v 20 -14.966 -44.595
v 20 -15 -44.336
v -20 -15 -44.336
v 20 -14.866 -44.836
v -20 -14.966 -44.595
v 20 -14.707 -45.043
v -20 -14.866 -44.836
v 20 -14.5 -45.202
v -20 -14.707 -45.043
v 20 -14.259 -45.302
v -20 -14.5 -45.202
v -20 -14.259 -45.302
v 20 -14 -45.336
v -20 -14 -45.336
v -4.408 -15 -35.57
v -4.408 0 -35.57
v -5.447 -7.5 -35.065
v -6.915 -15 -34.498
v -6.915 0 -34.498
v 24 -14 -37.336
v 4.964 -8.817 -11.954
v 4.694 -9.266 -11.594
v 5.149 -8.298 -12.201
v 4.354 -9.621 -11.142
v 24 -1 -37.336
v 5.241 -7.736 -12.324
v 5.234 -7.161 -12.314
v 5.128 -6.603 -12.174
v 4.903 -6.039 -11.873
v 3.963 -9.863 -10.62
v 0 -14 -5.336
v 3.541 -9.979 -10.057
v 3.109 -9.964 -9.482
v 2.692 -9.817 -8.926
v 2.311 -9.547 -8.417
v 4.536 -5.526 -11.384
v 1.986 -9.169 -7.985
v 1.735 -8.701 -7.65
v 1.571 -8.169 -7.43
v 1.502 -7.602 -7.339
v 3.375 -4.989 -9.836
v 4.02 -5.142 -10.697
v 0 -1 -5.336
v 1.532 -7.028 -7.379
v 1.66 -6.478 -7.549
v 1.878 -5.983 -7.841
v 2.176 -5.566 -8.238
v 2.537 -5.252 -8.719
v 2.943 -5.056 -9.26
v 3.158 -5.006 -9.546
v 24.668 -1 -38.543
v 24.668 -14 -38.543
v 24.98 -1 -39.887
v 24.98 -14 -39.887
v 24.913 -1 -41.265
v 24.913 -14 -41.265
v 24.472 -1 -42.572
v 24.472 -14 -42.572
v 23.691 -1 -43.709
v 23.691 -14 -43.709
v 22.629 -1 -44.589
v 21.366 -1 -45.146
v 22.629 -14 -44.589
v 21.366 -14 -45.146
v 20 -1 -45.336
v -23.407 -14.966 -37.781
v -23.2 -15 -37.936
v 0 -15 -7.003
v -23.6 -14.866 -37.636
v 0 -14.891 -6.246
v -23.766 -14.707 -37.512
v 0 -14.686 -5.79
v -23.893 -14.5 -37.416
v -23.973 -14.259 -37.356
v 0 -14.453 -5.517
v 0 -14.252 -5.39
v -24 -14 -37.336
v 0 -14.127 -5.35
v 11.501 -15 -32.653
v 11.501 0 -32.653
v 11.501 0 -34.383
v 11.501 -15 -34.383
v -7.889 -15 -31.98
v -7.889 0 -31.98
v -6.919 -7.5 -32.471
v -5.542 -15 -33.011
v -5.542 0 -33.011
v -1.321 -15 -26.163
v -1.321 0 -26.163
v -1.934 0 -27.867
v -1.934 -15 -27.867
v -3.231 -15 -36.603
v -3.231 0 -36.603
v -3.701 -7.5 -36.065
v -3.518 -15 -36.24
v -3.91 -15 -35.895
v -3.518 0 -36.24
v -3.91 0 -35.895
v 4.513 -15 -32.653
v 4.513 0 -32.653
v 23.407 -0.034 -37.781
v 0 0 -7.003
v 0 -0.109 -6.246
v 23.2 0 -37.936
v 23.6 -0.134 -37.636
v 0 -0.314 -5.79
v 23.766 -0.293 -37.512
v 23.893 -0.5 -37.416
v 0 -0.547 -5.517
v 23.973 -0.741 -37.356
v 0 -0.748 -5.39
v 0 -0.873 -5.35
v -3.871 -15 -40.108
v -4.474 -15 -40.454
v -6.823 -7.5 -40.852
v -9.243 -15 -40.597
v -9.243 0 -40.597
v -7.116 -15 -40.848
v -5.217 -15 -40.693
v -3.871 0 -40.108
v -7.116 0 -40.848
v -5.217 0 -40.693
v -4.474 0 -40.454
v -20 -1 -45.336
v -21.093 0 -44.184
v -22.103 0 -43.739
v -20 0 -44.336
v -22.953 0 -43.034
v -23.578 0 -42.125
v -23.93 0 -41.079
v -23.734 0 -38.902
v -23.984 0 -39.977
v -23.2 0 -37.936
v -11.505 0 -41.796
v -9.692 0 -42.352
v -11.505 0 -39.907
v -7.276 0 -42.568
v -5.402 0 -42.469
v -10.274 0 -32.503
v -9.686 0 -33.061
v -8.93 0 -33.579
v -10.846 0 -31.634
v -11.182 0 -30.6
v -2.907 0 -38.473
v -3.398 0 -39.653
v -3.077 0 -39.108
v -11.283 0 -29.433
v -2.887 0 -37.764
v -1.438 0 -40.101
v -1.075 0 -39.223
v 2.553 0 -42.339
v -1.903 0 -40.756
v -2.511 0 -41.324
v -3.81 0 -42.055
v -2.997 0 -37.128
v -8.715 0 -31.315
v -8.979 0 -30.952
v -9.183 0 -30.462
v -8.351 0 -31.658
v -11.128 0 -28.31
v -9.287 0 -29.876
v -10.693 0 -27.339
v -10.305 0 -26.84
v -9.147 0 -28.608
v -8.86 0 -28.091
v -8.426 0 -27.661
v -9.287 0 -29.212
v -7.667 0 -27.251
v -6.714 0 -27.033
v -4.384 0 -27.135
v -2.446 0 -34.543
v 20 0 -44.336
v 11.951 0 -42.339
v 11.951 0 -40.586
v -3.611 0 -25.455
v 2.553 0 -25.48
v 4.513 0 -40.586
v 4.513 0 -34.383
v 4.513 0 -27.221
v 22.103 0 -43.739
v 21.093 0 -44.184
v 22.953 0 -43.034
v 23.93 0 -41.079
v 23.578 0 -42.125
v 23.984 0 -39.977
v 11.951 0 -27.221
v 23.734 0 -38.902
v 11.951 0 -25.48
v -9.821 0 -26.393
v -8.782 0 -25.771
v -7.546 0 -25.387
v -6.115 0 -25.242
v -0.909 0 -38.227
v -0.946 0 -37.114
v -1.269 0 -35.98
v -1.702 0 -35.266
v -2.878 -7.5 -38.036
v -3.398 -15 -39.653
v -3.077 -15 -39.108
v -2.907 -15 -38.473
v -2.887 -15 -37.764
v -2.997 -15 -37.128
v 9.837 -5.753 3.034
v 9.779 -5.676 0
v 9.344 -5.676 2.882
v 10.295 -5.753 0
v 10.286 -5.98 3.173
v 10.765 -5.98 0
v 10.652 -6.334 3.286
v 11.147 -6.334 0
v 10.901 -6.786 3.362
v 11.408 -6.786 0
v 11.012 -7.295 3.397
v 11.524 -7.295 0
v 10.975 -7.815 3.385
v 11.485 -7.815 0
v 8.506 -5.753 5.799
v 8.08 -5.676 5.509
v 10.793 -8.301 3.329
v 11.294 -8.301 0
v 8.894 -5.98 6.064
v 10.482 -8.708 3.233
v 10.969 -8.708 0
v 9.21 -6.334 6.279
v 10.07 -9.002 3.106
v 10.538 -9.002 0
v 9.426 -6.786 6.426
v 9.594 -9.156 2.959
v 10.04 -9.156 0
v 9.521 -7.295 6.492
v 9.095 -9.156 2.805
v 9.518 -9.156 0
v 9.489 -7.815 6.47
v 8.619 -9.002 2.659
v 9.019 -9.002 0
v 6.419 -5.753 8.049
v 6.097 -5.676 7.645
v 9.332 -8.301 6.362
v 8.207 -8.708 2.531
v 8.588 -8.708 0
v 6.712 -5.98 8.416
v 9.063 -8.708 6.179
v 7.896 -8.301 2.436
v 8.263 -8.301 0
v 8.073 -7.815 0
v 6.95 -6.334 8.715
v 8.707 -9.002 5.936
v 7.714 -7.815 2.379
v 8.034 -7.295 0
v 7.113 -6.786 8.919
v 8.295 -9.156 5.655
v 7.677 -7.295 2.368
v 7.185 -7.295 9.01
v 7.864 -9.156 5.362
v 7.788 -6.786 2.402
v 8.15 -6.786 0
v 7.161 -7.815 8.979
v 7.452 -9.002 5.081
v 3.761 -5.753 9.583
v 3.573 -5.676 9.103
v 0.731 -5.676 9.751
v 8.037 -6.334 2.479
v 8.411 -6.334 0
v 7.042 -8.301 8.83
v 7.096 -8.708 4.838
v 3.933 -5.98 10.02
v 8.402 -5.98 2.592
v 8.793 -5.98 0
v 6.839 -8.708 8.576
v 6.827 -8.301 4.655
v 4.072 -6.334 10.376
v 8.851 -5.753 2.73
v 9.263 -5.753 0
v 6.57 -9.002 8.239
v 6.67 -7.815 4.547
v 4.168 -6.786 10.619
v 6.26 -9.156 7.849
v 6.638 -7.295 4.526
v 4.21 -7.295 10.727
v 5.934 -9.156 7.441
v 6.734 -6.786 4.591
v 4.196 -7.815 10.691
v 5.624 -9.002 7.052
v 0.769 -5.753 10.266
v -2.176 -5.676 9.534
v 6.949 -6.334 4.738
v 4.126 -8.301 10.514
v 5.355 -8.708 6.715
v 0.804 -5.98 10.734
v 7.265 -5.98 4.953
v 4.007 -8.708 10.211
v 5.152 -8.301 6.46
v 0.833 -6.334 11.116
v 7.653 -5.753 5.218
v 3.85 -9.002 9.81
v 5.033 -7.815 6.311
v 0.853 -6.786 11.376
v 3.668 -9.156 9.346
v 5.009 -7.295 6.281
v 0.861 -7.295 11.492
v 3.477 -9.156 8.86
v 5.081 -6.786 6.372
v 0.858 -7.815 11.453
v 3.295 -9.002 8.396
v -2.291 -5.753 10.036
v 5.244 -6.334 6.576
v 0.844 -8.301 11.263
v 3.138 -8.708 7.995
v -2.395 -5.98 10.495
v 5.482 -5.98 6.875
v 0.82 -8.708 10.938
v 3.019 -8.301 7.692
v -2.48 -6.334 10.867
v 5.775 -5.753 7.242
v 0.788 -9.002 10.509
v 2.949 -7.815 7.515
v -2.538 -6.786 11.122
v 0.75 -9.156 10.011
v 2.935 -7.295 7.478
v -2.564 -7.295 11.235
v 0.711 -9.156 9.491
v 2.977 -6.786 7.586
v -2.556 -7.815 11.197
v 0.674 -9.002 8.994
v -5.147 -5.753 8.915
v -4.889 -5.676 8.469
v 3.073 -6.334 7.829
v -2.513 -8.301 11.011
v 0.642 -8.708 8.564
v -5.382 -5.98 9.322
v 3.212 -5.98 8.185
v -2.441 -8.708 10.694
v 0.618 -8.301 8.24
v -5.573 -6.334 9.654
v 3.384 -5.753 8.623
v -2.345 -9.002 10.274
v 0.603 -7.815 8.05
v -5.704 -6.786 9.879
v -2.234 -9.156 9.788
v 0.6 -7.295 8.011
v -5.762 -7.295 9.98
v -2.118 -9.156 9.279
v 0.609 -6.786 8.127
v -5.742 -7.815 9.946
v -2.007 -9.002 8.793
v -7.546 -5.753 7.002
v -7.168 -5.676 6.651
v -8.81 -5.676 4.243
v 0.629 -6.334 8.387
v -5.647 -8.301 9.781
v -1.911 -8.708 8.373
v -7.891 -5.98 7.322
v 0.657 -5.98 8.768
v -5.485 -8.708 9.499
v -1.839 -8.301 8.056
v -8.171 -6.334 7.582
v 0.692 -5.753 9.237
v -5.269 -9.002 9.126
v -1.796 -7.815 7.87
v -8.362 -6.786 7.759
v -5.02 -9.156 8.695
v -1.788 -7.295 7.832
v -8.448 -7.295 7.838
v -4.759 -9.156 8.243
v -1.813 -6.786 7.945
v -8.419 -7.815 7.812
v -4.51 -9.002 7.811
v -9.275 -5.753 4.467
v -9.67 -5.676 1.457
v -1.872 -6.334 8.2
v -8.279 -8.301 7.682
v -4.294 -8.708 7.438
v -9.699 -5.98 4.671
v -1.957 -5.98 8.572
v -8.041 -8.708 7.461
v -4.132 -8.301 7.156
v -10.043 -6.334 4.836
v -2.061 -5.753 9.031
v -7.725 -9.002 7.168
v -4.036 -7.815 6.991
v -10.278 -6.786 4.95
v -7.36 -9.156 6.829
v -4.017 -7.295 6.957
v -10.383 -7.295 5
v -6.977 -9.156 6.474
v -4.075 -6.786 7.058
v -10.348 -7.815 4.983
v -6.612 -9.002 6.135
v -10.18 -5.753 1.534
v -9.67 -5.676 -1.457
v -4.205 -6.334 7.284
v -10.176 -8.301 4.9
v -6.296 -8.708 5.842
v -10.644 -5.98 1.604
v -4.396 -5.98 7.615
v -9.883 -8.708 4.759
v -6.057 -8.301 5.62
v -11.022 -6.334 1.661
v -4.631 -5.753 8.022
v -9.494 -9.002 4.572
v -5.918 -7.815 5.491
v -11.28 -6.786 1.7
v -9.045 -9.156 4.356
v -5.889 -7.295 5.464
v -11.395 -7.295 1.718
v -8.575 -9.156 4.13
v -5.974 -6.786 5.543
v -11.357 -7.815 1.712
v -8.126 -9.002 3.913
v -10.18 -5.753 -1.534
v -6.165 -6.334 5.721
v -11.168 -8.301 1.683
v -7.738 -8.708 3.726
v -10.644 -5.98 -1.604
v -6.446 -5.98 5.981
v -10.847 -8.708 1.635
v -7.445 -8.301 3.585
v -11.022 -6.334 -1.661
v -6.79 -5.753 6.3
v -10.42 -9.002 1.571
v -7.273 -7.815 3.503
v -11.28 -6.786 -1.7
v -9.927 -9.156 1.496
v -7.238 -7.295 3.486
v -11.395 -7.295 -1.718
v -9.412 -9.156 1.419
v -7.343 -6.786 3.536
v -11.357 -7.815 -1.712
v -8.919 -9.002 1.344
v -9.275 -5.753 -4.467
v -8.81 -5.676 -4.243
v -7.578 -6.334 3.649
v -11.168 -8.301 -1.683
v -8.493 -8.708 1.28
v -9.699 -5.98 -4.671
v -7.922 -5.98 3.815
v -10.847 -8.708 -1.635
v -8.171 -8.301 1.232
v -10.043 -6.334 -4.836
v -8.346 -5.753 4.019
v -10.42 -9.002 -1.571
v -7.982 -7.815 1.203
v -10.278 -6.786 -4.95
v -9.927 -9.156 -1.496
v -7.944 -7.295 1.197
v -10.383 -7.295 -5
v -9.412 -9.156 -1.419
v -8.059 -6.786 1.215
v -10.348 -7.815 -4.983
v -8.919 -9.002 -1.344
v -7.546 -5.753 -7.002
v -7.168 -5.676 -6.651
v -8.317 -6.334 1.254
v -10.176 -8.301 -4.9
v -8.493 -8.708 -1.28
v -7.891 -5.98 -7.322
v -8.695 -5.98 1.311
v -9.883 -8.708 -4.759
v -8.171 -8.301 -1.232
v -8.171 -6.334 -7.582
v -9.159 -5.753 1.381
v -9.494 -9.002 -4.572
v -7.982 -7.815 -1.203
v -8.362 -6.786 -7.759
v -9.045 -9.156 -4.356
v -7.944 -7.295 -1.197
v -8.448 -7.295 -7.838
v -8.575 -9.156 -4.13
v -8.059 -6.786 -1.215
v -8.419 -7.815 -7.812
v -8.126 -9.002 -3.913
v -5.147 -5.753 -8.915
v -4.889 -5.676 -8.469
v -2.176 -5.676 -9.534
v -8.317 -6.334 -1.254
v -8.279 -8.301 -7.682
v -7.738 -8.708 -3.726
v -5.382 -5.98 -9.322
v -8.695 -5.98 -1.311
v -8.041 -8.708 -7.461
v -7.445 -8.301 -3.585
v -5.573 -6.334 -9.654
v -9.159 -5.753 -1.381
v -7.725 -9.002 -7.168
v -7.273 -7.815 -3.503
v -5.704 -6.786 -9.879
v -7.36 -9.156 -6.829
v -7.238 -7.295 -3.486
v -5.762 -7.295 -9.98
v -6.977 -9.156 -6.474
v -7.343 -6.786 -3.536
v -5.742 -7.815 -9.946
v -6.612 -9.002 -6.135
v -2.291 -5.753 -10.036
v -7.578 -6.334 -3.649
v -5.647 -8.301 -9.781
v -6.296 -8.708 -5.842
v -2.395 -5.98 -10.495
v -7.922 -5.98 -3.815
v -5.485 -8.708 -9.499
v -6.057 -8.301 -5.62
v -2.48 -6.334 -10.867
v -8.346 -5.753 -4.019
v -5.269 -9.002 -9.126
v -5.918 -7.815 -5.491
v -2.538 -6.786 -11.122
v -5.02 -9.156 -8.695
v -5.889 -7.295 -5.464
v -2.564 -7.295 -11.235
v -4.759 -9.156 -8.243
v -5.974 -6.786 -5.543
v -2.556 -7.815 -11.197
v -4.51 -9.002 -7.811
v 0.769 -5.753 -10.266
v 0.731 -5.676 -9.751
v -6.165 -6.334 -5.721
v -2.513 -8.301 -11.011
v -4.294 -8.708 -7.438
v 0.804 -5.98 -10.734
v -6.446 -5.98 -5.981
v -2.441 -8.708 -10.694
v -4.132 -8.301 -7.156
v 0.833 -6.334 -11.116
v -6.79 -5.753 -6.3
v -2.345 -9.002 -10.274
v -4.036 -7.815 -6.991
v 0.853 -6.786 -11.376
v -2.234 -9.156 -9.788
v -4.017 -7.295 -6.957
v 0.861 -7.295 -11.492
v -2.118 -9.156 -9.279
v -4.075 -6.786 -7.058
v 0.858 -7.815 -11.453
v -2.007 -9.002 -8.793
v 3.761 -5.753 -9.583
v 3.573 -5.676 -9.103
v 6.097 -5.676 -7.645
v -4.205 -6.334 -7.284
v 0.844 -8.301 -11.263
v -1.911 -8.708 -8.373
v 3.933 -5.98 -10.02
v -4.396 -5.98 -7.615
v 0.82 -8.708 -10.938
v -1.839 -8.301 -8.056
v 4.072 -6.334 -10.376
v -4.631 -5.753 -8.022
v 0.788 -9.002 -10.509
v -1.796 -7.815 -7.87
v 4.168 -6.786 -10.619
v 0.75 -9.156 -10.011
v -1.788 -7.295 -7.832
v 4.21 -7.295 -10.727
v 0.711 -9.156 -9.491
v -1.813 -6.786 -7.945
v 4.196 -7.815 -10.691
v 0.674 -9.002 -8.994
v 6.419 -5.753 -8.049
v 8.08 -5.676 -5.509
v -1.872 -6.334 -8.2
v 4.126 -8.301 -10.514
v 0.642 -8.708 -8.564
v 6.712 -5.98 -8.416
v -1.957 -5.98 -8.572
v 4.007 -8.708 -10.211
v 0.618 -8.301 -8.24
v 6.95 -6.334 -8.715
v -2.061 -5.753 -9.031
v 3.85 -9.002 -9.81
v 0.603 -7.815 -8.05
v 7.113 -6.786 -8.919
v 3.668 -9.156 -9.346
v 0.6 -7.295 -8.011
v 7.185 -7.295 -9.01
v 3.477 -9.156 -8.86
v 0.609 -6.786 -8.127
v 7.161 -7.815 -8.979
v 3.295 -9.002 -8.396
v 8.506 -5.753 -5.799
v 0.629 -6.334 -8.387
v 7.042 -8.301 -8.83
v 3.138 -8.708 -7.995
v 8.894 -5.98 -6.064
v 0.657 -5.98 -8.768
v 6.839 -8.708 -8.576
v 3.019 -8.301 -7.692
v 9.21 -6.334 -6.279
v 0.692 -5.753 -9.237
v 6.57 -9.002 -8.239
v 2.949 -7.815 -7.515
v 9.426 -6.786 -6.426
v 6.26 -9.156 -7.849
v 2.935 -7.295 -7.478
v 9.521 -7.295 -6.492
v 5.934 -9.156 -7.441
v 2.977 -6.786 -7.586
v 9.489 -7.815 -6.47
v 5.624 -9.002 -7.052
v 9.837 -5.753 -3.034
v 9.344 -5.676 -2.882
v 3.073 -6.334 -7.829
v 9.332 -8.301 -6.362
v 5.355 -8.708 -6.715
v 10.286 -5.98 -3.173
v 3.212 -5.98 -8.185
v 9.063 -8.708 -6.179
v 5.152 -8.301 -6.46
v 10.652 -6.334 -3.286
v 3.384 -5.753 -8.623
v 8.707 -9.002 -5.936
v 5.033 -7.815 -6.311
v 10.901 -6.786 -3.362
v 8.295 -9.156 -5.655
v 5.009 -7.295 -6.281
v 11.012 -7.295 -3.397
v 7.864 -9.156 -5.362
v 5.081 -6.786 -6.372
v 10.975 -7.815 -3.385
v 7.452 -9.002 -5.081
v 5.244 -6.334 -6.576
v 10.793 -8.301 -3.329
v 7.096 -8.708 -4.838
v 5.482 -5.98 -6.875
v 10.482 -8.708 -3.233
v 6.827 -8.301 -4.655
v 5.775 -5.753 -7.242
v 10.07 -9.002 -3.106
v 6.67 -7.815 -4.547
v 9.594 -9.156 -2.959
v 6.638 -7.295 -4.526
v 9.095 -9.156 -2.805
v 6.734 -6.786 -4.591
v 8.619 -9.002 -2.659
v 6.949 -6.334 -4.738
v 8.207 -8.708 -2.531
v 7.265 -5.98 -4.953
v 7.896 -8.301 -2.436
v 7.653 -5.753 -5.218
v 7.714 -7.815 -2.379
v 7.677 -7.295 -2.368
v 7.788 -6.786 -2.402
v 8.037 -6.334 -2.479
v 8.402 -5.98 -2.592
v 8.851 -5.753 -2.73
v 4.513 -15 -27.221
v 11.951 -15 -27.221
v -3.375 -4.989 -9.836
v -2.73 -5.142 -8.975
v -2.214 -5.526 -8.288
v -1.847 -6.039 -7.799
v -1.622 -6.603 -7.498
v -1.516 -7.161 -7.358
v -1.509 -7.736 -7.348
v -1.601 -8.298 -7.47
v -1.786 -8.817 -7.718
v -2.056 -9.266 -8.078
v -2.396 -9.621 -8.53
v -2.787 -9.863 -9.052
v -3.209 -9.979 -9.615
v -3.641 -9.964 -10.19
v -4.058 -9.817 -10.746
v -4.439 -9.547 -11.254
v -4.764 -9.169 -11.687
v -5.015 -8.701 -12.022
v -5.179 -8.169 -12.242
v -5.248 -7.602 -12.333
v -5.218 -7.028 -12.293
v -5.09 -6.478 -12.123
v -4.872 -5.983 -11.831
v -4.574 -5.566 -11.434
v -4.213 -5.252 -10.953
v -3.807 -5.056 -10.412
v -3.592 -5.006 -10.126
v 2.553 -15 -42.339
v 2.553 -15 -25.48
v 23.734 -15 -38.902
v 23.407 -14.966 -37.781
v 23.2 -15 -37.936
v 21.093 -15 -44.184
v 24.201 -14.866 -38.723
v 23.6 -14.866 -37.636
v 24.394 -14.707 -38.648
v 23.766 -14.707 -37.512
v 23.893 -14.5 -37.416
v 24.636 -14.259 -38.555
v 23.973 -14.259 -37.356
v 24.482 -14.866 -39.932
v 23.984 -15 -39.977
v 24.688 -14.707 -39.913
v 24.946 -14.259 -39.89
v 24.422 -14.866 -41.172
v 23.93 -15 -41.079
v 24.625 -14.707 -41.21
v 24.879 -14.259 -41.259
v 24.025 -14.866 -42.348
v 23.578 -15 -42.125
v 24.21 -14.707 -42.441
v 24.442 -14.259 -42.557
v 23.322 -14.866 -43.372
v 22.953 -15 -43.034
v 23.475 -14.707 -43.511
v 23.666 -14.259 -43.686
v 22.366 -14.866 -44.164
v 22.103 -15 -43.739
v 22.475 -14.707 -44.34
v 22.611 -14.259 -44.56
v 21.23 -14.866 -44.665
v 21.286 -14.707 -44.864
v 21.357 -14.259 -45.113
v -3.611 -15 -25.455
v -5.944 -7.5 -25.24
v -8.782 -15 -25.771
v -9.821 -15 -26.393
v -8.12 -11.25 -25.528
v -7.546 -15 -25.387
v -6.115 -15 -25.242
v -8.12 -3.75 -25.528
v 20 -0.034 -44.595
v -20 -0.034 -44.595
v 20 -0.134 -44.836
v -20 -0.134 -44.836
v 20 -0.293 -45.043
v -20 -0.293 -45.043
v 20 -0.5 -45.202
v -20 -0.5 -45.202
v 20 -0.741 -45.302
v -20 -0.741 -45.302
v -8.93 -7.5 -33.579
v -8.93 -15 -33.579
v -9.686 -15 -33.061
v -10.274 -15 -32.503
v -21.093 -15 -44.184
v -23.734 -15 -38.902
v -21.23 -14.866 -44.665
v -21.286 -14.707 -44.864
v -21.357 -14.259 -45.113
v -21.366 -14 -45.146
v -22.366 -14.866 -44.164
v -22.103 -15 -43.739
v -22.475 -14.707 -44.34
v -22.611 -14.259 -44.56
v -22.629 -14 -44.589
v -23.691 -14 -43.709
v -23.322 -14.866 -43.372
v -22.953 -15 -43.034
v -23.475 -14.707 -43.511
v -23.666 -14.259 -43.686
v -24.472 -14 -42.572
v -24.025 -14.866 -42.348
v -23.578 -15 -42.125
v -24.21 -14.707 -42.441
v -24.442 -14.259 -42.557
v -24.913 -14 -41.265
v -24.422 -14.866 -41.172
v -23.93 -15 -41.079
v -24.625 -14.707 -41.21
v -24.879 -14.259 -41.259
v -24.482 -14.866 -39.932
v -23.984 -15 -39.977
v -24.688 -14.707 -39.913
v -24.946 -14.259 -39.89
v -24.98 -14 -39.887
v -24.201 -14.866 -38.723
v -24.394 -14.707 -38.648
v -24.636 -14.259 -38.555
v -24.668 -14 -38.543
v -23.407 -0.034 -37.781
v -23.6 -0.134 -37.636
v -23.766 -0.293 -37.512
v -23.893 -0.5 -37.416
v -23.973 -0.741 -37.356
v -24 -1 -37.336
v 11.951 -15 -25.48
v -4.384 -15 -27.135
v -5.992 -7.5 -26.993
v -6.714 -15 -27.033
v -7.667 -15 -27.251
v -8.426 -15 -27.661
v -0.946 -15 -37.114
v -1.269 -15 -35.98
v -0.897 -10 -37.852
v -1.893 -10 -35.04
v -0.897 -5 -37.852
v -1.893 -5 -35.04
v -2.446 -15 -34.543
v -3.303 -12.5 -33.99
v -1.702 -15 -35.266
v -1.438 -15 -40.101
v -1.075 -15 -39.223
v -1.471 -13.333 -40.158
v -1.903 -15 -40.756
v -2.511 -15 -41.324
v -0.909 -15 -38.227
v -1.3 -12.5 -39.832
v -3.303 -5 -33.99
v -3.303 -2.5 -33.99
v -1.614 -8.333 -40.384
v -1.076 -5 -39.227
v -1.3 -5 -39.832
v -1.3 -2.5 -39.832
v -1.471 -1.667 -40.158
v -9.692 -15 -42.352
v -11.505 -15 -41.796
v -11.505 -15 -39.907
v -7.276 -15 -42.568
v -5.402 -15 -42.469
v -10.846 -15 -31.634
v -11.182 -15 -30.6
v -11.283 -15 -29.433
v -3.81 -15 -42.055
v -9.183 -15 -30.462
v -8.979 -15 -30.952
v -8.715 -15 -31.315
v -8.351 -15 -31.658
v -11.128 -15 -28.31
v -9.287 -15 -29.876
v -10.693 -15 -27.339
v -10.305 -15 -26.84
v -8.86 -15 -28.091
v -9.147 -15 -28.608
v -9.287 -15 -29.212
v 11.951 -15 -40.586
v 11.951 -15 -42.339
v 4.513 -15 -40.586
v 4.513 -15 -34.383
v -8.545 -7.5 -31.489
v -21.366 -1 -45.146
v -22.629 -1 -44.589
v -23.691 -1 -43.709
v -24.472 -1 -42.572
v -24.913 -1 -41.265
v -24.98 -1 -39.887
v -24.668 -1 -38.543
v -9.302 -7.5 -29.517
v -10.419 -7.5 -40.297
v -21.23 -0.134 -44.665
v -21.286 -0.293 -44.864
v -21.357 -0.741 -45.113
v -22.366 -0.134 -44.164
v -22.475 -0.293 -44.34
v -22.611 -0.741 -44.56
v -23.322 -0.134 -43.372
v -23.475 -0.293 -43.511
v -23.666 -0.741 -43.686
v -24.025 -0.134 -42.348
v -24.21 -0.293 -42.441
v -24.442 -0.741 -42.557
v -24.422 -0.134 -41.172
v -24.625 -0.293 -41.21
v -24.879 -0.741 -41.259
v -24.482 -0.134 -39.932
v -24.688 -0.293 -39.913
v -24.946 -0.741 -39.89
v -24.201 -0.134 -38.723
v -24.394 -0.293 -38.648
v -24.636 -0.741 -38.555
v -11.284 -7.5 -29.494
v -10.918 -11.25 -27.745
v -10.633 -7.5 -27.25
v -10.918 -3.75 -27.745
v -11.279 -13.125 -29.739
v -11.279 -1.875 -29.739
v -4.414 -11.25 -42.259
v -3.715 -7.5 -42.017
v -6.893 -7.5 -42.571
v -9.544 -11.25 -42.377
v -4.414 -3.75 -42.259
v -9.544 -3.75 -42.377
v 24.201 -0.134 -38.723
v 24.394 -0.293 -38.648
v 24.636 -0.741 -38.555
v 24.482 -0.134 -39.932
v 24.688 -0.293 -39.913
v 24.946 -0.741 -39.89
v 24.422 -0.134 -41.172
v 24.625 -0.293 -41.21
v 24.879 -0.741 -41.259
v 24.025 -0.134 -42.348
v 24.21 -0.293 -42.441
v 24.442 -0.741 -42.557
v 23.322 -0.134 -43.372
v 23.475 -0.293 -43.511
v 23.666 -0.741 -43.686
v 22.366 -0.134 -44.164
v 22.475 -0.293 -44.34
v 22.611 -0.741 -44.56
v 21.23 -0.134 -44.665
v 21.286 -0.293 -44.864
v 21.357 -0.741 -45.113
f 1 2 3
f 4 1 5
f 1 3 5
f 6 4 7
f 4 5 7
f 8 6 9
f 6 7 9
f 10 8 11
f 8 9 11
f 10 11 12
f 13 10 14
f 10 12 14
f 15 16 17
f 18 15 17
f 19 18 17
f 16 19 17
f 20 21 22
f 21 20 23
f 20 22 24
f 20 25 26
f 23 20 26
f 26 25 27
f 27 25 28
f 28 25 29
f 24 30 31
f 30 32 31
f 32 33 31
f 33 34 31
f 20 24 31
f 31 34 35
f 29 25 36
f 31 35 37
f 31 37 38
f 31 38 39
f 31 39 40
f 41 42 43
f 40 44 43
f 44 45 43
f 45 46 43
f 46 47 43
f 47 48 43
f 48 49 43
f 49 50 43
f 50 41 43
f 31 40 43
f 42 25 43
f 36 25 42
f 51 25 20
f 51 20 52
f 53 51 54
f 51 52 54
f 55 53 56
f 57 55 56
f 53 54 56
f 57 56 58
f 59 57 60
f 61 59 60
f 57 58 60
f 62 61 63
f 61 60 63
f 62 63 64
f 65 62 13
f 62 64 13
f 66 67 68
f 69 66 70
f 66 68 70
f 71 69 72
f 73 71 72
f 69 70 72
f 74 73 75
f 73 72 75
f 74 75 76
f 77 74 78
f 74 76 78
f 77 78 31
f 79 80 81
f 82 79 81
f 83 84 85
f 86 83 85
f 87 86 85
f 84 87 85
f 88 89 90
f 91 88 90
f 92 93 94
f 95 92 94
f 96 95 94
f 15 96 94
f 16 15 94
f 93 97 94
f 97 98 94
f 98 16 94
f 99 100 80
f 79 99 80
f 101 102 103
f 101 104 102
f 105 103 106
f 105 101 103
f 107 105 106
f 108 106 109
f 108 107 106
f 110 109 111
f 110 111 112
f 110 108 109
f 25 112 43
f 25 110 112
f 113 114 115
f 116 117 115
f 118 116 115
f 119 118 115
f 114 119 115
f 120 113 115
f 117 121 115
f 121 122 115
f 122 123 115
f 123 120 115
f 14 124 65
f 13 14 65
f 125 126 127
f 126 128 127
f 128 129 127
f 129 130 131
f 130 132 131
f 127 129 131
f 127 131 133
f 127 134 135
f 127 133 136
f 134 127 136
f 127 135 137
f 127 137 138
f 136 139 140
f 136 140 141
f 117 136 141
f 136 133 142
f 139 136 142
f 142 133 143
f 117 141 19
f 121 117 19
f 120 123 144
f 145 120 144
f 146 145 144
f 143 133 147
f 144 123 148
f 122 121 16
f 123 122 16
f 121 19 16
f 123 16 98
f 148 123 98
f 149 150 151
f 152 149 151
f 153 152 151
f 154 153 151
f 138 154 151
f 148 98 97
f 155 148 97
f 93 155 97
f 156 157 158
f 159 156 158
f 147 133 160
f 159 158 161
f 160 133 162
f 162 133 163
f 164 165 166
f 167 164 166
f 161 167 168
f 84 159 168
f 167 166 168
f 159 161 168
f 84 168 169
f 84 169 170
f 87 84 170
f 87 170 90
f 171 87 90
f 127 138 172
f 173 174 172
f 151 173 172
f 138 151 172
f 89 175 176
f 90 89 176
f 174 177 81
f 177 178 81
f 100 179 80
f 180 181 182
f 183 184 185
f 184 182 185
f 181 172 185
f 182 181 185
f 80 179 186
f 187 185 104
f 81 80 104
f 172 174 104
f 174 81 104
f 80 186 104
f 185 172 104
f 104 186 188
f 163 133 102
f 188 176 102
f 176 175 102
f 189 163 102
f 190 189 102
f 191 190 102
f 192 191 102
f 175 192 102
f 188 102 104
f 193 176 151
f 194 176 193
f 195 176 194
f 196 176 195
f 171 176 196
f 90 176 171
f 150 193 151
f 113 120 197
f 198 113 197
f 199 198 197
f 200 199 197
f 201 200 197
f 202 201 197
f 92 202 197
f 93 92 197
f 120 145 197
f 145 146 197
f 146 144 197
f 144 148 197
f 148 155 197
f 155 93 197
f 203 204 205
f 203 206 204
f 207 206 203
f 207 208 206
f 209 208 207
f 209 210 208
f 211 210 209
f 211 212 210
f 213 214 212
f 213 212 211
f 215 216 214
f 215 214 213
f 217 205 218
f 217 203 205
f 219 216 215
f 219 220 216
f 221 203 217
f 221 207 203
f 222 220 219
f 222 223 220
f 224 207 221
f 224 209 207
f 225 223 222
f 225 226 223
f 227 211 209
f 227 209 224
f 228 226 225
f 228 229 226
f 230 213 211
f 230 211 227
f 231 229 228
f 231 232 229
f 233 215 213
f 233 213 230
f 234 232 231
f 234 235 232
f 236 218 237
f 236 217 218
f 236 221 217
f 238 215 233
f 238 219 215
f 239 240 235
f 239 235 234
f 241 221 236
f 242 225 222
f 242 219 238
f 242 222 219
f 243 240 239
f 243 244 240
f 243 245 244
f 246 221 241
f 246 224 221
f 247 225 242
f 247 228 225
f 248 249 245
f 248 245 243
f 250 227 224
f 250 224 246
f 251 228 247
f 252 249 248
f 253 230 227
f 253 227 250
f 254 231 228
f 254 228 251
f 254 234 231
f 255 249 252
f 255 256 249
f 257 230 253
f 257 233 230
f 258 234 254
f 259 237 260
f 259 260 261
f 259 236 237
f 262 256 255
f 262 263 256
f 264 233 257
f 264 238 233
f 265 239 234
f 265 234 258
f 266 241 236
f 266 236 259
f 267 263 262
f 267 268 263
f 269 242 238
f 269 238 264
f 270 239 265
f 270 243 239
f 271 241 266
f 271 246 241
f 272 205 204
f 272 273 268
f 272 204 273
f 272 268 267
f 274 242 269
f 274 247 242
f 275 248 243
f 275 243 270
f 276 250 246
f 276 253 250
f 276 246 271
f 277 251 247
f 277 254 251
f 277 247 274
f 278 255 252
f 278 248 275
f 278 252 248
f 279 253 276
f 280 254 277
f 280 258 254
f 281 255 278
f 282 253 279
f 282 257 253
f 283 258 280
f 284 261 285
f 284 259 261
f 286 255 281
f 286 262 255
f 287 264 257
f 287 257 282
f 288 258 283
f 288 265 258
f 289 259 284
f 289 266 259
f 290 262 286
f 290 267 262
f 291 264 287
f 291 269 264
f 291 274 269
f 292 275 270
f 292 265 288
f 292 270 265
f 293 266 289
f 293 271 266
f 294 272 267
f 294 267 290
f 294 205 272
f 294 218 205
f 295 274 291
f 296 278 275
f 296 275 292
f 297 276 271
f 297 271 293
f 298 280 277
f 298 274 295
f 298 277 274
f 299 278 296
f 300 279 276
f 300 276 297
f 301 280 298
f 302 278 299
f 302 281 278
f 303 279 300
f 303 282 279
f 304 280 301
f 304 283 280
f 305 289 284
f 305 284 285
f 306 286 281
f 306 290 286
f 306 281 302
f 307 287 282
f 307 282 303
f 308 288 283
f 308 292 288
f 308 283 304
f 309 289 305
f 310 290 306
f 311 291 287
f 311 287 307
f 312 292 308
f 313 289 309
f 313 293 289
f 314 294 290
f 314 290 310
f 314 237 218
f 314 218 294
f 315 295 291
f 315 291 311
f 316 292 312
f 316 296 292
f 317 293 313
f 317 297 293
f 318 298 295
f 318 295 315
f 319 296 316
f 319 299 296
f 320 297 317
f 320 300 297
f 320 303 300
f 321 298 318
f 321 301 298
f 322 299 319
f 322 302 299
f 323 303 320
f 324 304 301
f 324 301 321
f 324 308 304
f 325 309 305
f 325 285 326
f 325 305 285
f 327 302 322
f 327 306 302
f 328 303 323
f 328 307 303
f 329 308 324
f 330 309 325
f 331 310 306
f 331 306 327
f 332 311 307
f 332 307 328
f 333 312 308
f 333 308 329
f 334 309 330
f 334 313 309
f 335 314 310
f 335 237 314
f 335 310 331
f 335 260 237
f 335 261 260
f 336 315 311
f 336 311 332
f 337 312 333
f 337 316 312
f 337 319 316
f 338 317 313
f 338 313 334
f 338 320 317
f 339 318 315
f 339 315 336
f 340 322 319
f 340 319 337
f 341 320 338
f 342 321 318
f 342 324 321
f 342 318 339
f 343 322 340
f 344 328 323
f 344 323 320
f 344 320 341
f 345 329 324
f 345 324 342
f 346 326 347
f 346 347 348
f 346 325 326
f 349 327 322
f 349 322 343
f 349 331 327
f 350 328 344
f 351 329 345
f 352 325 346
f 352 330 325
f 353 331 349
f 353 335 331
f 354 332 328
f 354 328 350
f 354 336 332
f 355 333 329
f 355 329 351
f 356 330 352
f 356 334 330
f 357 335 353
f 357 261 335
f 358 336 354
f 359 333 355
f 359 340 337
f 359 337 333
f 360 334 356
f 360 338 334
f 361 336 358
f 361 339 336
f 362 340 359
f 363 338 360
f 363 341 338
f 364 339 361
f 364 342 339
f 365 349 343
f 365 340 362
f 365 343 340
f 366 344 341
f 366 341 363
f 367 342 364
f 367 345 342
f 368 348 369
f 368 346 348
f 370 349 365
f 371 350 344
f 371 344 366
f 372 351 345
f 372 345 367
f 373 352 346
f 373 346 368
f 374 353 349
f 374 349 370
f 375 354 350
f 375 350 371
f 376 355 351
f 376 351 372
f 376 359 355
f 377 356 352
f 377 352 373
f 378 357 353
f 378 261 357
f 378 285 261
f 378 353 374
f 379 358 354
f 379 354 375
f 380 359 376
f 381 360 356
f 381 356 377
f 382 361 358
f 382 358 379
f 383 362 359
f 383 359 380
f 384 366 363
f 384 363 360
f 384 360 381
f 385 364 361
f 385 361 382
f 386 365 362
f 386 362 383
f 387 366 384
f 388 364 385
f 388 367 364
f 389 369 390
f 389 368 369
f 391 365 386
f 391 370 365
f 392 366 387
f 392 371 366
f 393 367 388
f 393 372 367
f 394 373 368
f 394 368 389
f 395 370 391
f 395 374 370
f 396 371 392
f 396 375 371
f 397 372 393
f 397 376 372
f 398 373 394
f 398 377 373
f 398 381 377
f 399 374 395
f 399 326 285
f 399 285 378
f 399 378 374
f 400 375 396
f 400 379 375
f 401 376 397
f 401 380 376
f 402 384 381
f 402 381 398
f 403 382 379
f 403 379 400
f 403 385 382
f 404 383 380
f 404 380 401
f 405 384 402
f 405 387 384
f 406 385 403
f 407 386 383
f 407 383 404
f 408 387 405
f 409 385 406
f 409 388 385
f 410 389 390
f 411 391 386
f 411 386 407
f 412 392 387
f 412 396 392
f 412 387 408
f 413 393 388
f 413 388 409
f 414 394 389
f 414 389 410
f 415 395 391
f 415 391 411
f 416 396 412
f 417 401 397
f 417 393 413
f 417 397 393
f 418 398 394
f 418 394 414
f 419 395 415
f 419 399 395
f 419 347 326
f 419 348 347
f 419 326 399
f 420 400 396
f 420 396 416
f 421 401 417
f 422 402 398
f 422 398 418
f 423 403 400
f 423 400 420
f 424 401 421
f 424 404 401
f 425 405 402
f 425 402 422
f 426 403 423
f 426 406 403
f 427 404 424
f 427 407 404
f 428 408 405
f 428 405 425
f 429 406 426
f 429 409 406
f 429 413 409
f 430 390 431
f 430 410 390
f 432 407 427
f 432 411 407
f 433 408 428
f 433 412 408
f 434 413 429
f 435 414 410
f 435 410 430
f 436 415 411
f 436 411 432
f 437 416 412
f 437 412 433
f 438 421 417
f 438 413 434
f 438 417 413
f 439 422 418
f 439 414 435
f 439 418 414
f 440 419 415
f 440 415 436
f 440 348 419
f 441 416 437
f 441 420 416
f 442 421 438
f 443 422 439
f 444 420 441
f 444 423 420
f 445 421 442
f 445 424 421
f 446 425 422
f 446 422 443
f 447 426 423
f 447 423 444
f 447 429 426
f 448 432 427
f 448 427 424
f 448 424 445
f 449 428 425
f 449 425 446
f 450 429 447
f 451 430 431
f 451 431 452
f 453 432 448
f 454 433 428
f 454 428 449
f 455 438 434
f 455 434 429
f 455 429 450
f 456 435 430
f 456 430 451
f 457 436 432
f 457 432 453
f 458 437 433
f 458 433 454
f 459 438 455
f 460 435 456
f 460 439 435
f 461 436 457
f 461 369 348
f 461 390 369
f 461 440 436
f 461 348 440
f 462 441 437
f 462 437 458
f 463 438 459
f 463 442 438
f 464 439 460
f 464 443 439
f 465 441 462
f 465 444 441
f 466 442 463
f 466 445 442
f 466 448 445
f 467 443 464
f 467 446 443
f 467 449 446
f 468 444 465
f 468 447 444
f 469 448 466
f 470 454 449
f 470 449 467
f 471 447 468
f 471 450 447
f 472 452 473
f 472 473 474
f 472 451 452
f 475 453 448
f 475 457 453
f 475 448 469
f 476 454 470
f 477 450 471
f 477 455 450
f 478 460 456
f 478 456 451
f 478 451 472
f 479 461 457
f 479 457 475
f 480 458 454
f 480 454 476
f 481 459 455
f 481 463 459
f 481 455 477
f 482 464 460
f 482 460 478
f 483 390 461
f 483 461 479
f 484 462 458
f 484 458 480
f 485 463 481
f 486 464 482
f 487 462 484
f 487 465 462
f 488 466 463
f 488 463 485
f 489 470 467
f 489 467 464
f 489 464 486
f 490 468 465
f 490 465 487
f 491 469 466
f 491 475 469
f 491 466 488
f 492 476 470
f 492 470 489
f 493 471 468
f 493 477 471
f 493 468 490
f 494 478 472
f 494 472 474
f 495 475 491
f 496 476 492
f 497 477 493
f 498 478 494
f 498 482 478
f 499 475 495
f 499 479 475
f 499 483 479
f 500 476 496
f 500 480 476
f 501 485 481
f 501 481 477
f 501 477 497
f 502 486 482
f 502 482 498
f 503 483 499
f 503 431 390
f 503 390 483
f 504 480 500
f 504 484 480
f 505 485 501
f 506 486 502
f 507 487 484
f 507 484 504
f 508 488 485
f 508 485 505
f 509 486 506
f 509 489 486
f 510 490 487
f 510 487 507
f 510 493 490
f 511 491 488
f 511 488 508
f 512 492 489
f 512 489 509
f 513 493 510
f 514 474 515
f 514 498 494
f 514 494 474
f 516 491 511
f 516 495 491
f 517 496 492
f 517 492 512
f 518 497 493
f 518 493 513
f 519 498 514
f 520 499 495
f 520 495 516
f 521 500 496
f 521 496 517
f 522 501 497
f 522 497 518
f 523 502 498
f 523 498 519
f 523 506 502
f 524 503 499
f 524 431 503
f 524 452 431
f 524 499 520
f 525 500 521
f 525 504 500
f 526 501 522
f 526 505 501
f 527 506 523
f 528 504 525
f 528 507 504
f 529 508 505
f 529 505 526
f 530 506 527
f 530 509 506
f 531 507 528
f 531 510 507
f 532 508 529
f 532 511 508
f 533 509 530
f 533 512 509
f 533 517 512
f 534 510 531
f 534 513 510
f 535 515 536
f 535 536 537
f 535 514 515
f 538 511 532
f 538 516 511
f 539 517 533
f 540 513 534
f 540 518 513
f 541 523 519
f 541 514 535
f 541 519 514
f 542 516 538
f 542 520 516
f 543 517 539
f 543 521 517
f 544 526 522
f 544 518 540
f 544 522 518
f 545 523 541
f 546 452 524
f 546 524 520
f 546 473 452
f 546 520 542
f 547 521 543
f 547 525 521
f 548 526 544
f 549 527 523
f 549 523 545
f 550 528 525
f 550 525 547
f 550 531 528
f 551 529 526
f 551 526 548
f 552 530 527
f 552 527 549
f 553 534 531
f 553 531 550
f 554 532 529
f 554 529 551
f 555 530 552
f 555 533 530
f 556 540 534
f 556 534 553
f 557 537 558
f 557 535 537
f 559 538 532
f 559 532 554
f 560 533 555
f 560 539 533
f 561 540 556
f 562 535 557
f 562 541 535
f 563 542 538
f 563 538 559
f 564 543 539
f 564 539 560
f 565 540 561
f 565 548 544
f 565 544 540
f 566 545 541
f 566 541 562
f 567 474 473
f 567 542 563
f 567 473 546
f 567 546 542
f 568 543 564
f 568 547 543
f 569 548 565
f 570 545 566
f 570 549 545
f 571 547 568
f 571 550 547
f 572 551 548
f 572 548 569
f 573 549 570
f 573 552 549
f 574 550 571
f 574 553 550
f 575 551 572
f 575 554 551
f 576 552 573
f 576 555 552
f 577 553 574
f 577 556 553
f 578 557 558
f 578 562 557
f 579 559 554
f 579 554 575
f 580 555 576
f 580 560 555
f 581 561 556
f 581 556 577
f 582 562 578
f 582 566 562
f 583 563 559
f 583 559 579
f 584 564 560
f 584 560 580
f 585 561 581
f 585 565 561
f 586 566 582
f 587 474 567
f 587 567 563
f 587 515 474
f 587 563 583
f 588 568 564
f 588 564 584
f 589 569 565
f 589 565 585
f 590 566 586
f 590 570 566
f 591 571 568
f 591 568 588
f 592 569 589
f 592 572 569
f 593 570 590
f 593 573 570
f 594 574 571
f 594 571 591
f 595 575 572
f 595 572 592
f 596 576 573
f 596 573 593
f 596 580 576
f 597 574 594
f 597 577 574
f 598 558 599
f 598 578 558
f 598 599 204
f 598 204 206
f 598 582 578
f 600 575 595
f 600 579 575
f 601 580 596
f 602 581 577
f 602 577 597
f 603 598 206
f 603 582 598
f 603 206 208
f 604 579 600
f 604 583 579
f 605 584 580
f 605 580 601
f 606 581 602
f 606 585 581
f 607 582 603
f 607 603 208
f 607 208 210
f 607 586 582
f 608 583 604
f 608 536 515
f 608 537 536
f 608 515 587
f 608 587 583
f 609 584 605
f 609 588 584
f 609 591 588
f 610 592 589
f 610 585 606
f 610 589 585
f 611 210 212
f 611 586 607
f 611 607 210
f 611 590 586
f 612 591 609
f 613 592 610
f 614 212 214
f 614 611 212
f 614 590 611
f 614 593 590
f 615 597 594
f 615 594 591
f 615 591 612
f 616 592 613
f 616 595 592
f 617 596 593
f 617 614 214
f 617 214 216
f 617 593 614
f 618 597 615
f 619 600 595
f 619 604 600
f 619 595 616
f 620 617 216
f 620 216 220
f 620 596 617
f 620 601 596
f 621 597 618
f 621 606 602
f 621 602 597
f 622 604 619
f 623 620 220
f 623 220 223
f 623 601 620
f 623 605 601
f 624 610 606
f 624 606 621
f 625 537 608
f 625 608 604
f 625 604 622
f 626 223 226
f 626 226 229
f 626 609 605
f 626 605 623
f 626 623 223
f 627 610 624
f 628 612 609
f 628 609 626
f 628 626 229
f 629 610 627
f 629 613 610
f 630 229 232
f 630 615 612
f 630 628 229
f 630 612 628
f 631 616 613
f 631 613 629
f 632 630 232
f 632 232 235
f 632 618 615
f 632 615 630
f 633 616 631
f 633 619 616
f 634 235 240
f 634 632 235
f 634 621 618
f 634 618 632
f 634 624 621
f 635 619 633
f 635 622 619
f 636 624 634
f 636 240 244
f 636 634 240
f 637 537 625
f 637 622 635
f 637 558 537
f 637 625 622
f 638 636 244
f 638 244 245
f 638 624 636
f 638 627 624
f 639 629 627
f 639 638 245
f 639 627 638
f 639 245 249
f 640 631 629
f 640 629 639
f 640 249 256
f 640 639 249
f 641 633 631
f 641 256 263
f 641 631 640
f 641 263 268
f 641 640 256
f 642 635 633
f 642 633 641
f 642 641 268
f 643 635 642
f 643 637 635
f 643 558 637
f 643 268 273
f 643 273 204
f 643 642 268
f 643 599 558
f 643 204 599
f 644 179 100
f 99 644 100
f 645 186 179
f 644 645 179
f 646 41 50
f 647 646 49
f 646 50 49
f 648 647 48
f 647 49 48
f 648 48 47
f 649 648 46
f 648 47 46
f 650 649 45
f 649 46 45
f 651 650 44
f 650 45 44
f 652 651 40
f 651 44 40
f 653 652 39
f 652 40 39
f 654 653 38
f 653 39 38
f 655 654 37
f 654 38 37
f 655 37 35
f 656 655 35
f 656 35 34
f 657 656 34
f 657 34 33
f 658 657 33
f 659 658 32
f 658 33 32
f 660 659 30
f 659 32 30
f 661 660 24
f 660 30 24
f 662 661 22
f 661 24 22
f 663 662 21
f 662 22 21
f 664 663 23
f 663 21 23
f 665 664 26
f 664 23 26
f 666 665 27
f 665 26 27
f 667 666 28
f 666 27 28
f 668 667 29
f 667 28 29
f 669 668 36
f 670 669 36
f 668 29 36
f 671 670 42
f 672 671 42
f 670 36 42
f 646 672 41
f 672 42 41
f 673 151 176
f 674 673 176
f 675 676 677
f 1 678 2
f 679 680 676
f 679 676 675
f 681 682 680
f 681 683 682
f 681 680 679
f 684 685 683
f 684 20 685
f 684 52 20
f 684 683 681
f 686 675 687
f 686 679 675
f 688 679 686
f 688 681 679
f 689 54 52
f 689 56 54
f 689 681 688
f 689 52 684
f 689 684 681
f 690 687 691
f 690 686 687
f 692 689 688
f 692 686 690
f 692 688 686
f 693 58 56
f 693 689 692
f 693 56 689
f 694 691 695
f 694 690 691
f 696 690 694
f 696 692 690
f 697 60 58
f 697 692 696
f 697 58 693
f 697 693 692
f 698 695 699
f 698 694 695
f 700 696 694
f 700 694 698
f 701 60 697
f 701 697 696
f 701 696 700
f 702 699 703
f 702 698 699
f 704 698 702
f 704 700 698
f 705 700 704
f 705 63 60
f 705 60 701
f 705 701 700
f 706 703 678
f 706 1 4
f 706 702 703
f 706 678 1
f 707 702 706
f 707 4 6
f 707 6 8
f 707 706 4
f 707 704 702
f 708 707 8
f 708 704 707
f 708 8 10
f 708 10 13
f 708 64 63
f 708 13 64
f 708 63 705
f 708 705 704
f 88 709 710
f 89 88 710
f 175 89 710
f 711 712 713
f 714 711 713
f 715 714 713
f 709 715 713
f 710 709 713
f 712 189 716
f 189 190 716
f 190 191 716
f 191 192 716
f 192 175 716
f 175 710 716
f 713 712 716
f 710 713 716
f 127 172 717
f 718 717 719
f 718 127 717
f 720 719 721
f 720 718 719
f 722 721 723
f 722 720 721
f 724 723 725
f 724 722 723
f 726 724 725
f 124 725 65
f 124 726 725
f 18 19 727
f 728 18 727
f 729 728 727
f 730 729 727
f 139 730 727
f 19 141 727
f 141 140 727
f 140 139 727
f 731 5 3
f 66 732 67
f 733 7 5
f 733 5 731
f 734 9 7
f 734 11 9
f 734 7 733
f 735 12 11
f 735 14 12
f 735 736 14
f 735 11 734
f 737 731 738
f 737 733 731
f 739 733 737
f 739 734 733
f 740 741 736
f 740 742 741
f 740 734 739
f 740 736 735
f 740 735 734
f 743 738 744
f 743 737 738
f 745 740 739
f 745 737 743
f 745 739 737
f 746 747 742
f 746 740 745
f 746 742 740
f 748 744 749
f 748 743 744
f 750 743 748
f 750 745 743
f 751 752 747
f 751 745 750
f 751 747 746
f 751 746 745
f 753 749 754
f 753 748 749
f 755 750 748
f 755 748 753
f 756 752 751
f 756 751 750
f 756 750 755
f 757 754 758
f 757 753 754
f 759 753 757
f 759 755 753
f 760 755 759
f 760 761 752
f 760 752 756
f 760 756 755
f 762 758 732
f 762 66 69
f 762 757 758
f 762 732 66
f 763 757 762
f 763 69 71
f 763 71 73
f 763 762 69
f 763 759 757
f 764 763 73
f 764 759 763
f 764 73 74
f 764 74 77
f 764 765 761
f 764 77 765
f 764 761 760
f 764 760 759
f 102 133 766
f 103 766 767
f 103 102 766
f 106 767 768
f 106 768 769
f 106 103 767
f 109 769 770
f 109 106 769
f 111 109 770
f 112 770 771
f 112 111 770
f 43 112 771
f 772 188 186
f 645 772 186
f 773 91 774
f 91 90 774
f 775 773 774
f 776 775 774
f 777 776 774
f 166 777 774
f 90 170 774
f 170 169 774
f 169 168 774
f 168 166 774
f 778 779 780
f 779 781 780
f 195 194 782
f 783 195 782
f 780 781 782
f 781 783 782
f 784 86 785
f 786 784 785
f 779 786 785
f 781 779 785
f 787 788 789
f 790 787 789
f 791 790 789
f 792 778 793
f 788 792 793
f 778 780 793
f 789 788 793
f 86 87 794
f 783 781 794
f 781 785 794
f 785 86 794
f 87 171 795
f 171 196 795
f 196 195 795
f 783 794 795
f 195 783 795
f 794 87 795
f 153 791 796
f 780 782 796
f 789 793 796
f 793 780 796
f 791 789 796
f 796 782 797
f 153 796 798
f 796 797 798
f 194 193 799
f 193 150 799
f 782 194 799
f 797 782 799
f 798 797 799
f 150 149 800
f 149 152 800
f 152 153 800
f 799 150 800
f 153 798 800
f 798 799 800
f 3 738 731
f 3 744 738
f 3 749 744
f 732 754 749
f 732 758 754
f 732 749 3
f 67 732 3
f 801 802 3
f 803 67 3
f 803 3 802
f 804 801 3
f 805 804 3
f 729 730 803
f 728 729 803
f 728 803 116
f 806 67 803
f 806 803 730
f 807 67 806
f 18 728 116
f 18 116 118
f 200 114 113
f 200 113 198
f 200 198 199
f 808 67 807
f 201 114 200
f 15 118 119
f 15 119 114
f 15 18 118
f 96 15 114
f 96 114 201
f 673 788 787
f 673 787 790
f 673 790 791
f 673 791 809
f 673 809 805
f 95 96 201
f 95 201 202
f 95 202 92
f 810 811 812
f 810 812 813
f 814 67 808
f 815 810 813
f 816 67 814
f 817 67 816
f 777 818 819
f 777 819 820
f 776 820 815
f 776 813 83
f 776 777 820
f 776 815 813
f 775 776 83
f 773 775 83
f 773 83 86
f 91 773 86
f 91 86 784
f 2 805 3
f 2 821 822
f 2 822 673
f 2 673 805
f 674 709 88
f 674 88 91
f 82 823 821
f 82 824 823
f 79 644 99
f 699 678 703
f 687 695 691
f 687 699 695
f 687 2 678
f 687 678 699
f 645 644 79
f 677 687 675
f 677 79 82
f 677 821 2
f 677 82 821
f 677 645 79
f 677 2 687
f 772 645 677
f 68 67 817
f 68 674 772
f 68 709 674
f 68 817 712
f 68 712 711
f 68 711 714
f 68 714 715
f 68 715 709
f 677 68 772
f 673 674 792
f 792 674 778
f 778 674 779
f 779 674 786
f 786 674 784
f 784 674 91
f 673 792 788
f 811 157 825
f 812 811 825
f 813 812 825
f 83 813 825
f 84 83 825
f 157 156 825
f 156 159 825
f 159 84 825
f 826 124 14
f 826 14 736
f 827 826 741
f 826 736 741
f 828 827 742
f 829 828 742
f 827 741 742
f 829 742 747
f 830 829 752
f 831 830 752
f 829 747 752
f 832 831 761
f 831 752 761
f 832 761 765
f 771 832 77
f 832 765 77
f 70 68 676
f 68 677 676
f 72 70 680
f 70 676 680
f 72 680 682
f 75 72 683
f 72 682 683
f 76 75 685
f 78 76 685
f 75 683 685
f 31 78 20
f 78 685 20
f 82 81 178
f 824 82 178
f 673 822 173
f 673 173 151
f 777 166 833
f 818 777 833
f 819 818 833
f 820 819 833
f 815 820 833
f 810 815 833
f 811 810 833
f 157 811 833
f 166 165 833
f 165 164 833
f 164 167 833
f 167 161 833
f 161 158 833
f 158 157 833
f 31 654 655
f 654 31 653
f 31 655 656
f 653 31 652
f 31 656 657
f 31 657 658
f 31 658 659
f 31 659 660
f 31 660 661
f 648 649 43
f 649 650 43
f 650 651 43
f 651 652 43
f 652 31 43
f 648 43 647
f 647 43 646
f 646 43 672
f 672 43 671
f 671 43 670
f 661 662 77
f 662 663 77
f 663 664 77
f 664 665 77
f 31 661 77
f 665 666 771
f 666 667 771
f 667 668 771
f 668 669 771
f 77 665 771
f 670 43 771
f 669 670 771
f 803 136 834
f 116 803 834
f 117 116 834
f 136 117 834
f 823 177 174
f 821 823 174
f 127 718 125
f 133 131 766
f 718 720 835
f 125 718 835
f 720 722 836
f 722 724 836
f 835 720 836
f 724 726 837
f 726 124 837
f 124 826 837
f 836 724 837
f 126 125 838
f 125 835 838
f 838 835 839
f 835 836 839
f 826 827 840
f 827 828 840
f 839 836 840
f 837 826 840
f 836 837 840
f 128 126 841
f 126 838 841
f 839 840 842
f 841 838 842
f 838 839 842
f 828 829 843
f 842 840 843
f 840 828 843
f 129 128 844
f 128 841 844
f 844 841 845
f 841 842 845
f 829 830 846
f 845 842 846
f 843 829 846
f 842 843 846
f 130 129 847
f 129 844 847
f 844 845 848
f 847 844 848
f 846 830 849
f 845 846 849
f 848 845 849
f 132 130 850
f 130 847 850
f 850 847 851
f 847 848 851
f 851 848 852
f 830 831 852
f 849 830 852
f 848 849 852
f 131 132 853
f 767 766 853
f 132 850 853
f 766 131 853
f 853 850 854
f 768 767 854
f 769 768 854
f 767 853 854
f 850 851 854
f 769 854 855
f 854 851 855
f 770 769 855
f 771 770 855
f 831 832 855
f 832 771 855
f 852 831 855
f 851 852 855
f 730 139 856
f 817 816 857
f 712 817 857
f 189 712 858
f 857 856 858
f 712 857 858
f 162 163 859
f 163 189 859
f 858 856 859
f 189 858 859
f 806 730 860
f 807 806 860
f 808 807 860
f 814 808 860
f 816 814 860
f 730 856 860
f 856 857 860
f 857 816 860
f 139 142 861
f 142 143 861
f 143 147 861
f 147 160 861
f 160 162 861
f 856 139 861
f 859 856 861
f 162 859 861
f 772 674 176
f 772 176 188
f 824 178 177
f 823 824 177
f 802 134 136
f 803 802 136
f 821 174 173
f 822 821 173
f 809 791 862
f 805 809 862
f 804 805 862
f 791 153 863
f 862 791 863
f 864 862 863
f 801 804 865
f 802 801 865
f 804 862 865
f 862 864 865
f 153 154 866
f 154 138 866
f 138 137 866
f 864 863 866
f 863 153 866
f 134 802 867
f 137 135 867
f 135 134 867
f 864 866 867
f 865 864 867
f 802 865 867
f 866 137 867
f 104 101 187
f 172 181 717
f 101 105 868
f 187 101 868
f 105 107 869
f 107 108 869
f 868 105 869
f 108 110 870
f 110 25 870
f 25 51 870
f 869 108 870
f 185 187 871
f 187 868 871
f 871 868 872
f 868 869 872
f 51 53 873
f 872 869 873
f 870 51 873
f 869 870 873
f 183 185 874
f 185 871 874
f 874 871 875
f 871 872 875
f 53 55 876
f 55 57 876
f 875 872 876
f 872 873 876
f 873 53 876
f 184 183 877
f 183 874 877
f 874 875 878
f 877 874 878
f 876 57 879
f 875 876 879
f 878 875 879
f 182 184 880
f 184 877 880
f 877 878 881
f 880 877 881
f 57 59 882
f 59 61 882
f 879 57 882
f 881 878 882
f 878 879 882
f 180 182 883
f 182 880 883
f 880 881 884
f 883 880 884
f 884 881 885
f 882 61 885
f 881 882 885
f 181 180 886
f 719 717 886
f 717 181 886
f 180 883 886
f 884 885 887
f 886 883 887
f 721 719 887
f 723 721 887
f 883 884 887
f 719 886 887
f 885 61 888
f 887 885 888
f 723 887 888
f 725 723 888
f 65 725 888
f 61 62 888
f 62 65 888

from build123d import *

# Parameters (mm, degrees)
F1_DEPTH = 15
F2_R     = 5
F3_R     = 1
F4_R     = 2.5
F5_DEPTH = 12.5
F6_R     = 1.75


with BuildPart() as f1:
    # F0 (on Front) → F1 (new body)
    with BuildSketch(Plane.XZ):
        Polygon((30, -45.3359890039), (0, -5.3359890039), (-30, -45.3359890039), (0, -45.3359890039), align=None)
        with BuildLine():
            add(Edge.make_bspline(
                [(-1.8929857079, -35.0402501436), (-0.896730762, -36.1250610847), (-0.896730762, -37.8519029909)],
                knots=[0, 0, 0, 1, 1, 1], degree=2))
            add(Edge.make_bspline(
                [(-0.896730762, -37.8519029909), (-0.896730762, -40.0768723701), (-2.5110327577, -41.324035969)],
                knots=[0, 0, 0, 1, 1, 1], degree=2))
            add(Edge.make_bspline(
                [(-2.5110327577, -41.324035969), (-4.1253347533, -42.571199568), (-6.8927096031, -42.571199568)],
                knots=[0, 0, 0, 1, 1, 1], degree=2))
            add(Edge.make_bspline(
                [(-6.8927096031, -42.571199568), (-9.888854107, -42.571199568), (-11.5050010193, -41.79633461)],
                knots=[0, 0, 0, 1, 1, 1], degree=2))
            Line((-11.5050010193, -41.79633461), (-11.5050010193, -39.907140046))
            add(Edge.make_bspline(
                [(-11.5050010193, -39.907140046), (-10.4644680758, -40.3425403557), (-9.2431333088, -40.5971388418)],
                knots=[0, 0, 0, 1, 1, 1], degree=2))
            add(Edge.make_bspline(
                [(-9.2431333088, -40.5971388418), (-8.0217985417, -40.851737328), (-6.8226027735, -40.851737328)],
                knots=[0, 0, 0, 1, 1, 1], degree=2))
            add(Edge.make_bspline(
                [(-6.8226027735, -40.851737328), (-4.8633013799, -40.851737328), (-3.8707362672, -40.1082359517)],
                knots=[0, 0, 0, 1, 1, 1], degree=2))
            add(Edge.make_bspline(
                [(-3.8707362672, -40.1082359517), (-2.8781711544, -39.3647345754), (-2.8781711544, -38.0363946476)],
                knots=[0, 0, 0, 1, 1, 1], degree=2))
            add(Edge.make_bspline(
                [(-2.8781711544, -38.0363946476), (-2.8781711544, -37.161904195), (-3.2305502186, -36.6028944754)],
                knots=[0, 0, 0, 1, 1, 1], degree=2))
            add(Edge.make_bspline(
                [(-3.2305502186, -36.6028944754), (-3.5829292828, -36.0438847557), (-4.407606988, -35.5697411982)],
                knots=[0, 0, 0, 1, 1, 1], degree=2))
            add(Edge.make_bspline(
                [(-4.407606988, -35.5697411982), (-5.2322846932, -35.0955976406), (-6.9148486019, -34.497844673)],
                knots=[0, 0, 0, 1, 1, 1], degree=2))
            add(Edge.make_bspline(
                [(-6.9148486019, -34.497844673), (-9.2652723076, -33.6565627187), (-10.2744416694, -32.5034898647)],
                knots=[0, 0, 0, 1, 1, 1], degree=2))
            add(Edge.make_bspline(
                [(-10.2744416694, -32.5034898647), (-11.2836110313, -31.3504170106), (-11.2836110313, -29.4944309447)],
                knots=[0, 0, 0, 1, 1, 1], degree=2))
            add(Edge.make_bspline(
                [(-11.2836110313, -29.4944309447), (-11.2836110313, -27.5461990505), (-9.8205921941, -26.3931261965)],
                knots=[0, 0, 0, 1, 1, 1], degree=2))
            add(Edge.make_bspline(
                [(-9.8205921941, -26.3931261965), (-8.3575733568, -25.2400533424), (-5.9444224879, -25.2400533424)],
                knots=[0, 0, 0, 1, 1, 1], degree=2))
            add(Edge.make_bspline(
                [(-5.9444224879, -25.2400533424), (-3.4316461243, -25.2400533424), (-1.3210615723, -26.1625116257)],
                knots=[0, 0, 0, 1, 1, 1], degree=2))
            Line((-1.3210615723, -26.1625116257), (-1.9335738723, -27.8672145331))
            add(Edge.make_bspline(
                [(-1.9335738723, -27.8672145331), (-4.0220194256, -26.9927240806), (-5.9923903186, -26.9927240806)],
                knots=[0, 0, 0, 1, 1, 1], degree=2))
            add(Edge.make_bspline(
                [(-5.9923903186, -26.9927240806), (-7.5494999007, -26.9927240806), (-8.4258352698, -27.6605838776)],
                knots=[0, 0, 0, 1, 1, 1], degree=2))
            add(Edge.make_bspline(
                [(-8.4258352698, -27.6605838776), (-9.3021706389, -28.3284436747), (-9.3021706389, -29.5165699435)],
                knots=[0, 0, 0, 1, 1, 1], degree=2))
            add(Edge.make_bspline(
                [(-9.3021706389, -29.5165699435), (-9.3021706389, -30.391060396), (-8.9793102398, -30.9519150323)],
                knots=[0, 0, 0, 1, 1, 1], degree=2))
            add(Edge.make_bspline(
                [(-8.9793102398, -30.9519150323), (-8.6564498406, -31.5127696685), (-7.888964549, -31.9795335598)],
                knots=[0, 0, 0, 1, 1, 1], degree=2))
            add(Edge.make_bspline(
                [(-7.888964549, -31.9795335598), (-7.1214792573, -32.4462974511), (-5.5422306764, -33.0108419204)],
                knots=[0, 0, 0, 1, 1, 1], degree=2))
            add(Edge.make_bspline(
                [(-5.5422306764, -33.0108419204), (-2.8892406538, -33.9554392025), (-1.8929857079, -35.0402501436)],
                knots=[0, 0, 0, 1, 1, 1], degree=2))
        make_face(mode=Mode.SUBTRACT)
        Polygon((11.951268207, -40.5860693424), (11.951268207, -42.3387400806), (2.5532632173, -42.3387400806), (2.5532632173, -25.4798924961), (11.951268207, -25.4798924961), (11.951268207, -27.2214937348), (4.512564611, -27.2214937348), (4.512564611, -32.6529281066), (11.5011085648, -32.6529281066), (11.5011085648, -34.3834598459), (4.512564611, -34.3834598459), (4.512564611, -40.5860693424), align=None, mode=Mode.SUBTRACT)
    extrude(amount=F1_DEPTH)

    # F2
    f2_edges = [f1.edges().sort_by_distance(p)[0] for p in [
        (30, -7.5, -45.335989),
        (-30, -7.5, -45.335989),
    ]]
    fillet(f2_edges, radius=F2_R)

    # F3
    f3_edges = [f1.edges().sort_by_distance(p)[0] for p in [
        (-24.472136, 0, -42.572057),
        (-20, -7.5, -45.335989),
        (-24, -7.5, -37.335989),
        (-24.472136, -15, -42.572057),
        (24.472136, 0, -42.572057),
        (20, -7.5, -45.335989),
        (24, -7.5, -37.335989),
        (24.472136, -15, -42.572057),
    ]]
    fillet(f3_edges, radius=F3_R)

    # F4 (on Right) → F5 (cut, symmetric)
    with BuildSketch(Plane.YZ):
        with Locations((-7.4887694791, -9.8359890039)):
            Circle(F4_R)
    extrude(amount=F5_DEPTH, both=True, mode=Mode.SUBTRACT)


with BuildPart() as f9:
    # F9: sweep along a path in F8
    with BuildLine(Plane.XZ.offset(7.4256048538)) as f9_path:
        CenterArc((0, 0), 10, 0, 360)
    # F6 (on Right) → F9 (sweep)
    with BuildSketch(Plane.YZ):
        with Locations((-7.4256048538, -9.7787408158)):
            Circle(F6_R)
    sweep(path=f9_path.line)


solid = Compound([f1.part, f9.part])
